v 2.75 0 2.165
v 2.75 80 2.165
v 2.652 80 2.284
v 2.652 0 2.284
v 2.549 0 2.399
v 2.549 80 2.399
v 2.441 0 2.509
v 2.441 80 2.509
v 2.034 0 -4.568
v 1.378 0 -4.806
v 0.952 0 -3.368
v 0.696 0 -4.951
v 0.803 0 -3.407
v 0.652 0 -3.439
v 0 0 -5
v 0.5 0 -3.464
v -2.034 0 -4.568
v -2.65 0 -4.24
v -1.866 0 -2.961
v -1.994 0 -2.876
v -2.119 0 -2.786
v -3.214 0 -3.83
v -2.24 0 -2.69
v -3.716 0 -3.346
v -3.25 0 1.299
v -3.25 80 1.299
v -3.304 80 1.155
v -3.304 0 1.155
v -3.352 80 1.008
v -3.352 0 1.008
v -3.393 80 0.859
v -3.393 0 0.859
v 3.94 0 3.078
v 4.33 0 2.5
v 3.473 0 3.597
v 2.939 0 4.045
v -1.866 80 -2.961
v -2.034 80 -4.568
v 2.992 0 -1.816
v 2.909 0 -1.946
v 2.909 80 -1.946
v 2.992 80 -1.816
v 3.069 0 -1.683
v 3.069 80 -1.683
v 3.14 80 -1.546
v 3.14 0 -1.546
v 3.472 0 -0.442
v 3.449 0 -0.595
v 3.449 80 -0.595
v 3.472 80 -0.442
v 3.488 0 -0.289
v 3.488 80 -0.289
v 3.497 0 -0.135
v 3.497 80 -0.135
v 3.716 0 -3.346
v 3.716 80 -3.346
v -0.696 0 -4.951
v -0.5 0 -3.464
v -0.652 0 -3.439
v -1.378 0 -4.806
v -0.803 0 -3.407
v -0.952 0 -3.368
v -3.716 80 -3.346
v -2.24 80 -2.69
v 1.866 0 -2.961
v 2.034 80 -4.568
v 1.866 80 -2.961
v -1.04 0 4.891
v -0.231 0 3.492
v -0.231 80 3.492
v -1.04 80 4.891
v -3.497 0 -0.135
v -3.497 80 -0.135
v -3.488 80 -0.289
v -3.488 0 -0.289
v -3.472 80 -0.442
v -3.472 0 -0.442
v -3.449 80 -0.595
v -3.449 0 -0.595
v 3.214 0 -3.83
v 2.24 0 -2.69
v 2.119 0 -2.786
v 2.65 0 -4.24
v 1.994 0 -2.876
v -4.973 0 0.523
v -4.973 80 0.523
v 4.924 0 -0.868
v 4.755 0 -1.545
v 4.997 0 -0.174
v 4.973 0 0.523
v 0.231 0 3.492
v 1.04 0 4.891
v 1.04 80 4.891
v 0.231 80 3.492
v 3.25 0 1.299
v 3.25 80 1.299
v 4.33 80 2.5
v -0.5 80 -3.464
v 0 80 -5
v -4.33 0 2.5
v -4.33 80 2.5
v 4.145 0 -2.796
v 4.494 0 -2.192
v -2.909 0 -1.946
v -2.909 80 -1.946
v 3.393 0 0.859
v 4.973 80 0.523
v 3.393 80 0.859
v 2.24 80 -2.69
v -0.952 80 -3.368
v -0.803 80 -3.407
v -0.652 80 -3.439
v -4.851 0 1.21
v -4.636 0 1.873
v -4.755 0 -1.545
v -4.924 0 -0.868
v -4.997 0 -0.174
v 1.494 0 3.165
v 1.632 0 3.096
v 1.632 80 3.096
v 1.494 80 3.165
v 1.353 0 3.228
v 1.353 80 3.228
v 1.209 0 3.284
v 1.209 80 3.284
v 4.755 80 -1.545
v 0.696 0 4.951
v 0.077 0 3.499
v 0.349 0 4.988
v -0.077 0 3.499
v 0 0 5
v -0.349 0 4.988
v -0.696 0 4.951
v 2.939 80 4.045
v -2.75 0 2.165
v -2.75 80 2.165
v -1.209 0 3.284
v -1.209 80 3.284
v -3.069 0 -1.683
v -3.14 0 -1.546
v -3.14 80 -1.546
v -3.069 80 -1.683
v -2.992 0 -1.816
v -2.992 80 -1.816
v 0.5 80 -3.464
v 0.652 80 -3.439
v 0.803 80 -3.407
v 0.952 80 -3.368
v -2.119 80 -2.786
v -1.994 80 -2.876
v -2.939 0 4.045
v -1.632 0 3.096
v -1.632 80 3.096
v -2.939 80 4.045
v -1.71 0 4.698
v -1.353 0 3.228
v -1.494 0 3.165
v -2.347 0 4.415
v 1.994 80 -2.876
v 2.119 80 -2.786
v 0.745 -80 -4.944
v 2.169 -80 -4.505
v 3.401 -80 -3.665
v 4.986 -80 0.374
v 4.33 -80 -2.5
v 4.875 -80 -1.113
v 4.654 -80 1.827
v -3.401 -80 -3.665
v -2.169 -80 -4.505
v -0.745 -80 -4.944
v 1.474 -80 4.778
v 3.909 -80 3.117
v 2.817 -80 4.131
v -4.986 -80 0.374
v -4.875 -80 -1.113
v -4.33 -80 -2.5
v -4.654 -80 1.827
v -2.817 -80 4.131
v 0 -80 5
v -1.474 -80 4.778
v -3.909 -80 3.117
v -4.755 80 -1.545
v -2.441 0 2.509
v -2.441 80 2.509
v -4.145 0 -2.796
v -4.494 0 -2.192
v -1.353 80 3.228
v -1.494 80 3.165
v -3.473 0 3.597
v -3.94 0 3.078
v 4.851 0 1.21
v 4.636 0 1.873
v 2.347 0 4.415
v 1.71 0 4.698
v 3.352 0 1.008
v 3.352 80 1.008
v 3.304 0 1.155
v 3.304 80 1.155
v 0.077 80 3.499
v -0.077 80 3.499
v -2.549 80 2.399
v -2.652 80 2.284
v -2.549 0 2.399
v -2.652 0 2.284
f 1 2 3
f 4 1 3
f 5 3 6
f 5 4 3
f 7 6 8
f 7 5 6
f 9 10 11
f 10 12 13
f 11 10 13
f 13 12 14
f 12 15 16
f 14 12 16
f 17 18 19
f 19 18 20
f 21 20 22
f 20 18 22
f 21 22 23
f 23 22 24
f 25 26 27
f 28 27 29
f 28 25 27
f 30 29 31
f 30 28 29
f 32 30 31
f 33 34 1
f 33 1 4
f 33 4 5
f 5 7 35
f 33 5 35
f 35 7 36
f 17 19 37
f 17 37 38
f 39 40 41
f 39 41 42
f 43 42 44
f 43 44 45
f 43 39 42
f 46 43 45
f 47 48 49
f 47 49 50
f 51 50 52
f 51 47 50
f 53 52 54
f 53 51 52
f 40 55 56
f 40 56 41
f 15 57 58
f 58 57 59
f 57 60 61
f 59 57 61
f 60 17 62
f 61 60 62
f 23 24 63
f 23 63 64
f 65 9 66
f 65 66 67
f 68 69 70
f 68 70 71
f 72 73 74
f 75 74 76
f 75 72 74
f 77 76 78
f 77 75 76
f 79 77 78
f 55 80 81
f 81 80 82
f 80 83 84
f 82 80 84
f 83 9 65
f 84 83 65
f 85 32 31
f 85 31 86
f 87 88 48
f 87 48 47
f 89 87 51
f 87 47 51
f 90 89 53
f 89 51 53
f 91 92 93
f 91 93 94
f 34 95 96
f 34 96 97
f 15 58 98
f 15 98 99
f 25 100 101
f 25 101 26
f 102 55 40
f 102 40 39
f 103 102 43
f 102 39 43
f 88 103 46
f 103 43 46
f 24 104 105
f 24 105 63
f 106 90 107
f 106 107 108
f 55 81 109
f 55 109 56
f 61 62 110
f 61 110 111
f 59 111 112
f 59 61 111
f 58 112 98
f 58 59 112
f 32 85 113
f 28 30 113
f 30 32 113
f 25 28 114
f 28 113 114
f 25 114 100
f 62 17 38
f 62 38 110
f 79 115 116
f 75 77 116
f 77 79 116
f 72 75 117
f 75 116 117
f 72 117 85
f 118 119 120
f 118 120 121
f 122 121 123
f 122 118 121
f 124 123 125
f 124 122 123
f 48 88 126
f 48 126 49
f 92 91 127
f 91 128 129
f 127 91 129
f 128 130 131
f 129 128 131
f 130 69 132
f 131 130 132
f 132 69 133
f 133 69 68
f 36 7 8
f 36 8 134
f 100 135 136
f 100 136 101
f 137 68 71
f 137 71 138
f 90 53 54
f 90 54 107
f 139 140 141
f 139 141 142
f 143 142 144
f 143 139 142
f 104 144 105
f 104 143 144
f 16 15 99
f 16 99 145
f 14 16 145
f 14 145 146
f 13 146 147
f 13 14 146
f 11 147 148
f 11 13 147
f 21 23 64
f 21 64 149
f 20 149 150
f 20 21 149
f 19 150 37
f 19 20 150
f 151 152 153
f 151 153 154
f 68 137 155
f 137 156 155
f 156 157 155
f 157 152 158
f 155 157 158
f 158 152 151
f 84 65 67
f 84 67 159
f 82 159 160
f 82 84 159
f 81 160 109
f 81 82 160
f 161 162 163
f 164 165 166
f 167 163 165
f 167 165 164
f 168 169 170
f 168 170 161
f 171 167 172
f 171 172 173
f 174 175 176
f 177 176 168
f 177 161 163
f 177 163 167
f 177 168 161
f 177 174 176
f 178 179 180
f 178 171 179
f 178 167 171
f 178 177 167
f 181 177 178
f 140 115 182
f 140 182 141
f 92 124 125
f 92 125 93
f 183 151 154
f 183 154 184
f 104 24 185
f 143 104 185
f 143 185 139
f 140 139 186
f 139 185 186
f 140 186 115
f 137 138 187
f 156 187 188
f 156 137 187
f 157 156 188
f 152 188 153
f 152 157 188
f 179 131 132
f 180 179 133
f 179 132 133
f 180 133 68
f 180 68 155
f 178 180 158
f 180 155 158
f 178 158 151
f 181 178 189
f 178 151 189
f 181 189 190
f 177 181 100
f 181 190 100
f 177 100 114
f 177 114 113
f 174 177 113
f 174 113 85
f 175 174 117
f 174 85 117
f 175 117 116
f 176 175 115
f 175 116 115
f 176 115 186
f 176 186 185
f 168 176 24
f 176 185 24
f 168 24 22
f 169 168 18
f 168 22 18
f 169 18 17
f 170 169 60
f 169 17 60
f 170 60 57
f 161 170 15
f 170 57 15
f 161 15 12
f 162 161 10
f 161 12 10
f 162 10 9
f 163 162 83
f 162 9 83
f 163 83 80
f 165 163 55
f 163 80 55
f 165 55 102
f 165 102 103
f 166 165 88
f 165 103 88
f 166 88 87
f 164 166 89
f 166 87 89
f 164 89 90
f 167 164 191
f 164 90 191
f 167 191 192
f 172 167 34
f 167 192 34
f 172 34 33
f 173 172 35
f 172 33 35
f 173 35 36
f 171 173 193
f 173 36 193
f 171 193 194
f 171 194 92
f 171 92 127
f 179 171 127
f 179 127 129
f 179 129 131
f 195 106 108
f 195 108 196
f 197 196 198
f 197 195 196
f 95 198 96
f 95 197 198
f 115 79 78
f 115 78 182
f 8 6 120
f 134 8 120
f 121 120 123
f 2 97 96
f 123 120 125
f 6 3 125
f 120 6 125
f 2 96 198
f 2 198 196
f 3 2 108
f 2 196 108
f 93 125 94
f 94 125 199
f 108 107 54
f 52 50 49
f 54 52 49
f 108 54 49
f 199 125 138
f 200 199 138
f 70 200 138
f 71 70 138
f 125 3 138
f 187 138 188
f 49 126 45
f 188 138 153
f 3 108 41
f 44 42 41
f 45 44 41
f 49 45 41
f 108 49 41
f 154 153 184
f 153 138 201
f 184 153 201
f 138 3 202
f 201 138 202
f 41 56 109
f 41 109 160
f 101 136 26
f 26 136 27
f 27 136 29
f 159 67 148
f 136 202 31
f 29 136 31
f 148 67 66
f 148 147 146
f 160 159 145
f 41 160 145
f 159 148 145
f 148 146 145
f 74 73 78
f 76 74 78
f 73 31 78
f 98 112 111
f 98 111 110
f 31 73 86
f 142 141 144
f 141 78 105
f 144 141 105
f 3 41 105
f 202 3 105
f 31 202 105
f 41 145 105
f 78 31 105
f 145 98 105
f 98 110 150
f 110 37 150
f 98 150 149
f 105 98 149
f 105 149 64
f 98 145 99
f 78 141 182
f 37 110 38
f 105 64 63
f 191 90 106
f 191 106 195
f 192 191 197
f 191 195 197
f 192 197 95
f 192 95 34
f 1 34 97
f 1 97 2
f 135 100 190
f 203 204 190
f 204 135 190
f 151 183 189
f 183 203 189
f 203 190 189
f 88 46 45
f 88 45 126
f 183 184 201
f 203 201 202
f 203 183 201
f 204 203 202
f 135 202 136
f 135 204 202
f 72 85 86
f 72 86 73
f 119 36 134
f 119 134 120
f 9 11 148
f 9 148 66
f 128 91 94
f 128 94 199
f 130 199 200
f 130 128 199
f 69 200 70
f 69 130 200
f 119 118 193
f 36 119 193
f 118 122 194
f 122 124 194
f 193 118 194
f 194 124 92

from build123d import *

# Parameters (mm, degrees)
SKETCH1_W           = 5
SKETCH1_H           = 80
BOSS_EXTRUDE1_DEPTH = 80


with BuildPart() as part:
    # Sketch1 → Revolve1 (revolve)
    with BuildSketch(Plane.XY, mode=Mode.PRIVATE) as revolve1_sk:
        with Locations((-2.5, -40)):
            Rectangle(SKETCH1_W, SKETCH1_H)
    revolve(revolve1_sk.sketch.rotate(Axis((0, 80, 0), (0, -1, 0)), 270), axis=Axis((0, 80, 0), (0, -1, 0)))

    # Sketch2 → Boss-Extrude1 (add)
    with BuildSketch(Plane(origin=(0, 0, 0), x_dir=(1, 0, 0), z_dir=(0, 1, 0))):
        with BuildLine():
            Line((-0.5, 3.464101615), (0, 5))
            Line((0, 5), (0.5, 3.464101615))
            ThreePointArc((0.5, 3.464101615), (0.727690918, 3.423516603), (0.952204333, 3.367982617))
            Line((0.952204333, 3.367982617), (2.033683215, 4.567727288))
            Line((2.033683215, 4.567727288), (1.865749791, 2.961245974))
            ThreePointArc((1.865749791, 2.961245974), (2.057248383, 2.83155948), (2.239763887, 2.689508827))
            Line((2.239763887, 2.689508827), (3.715724127, 3.345653032))
            Line((3.715724127, 3.345653032), (2.908894493, 1.946364001))
            ThreePointArc((2.908894493, 1.946364001), (3.031088913, 1.75), (3.140047917, 1.545994527))
            Line((3.140047917, 1.545994527), (4.755282581, 1.545084972))
            Line((4.755282581, 1.545084972), (3.449064911, 0.594938011))
            ThreePointArc((3.449064911, 0.594938011), (3.480826634, 0.365849621), (3.497389136, 0.135163729))
            Line((3.497389136, 0.135163729), (4.972609477, -0.522642316))
            Line((4.972609477, -0.522642316), (3.392860672, -0.859358166))
            ThreePointArc((3.392860672, -0.859358166), (3.328697807, -1.08155948), (3.25, -1.299038106))
            Line((3.25, -1.299038106), (4.330127019, -2.5))
            Line((4.330127019, -2.5), (2.75, -2.165063509))
            ThreePointArc((2.75, -2.165063509), (2.601006889, -2.341957122), (2.440656339, -2.508624451))
            Line((2.440656339, -2.508624451), (2.938926261, -4.045084972))
            Line((2.938926261, -4.045084972), (1.631639345, -3.096409703))
            ThreePointArc((1.631639345, -3.096409703), (1.423578251, -3.197409102), (1.209301024, -3.284446838))
            Line((1.209301024, -3.284446838), (1.039558454, -4.890738004))
            Line((1.039558454, -4.890738004), (0.231153424, -3.492358529))
            ThreePointArc((0.231153424, -3.492358529), (0, -3.5), (-0.231153424, -3.492358529))
            Line((-0.231153424, -3.492358529), (-1.039558454, -4.890738004))
            Line((-1.039558454, -4.890738004), (-1.209301024, -3.284446838))
            ThreePointArc((-1.209301024, -3.284446838), (-1.423578251, -3.197409102), (-1.631639345, -3.096409703))
            Line((-1.631639345, -3.096409703), (-2.938926261, -4.045084972))
            Line((-2.938926261, -4.045084972), (-2.440656339, -2.508624451))
            ThreePointArc((-2.440656339, -2.508624451), (-2.601006889, -2.341957122), (-2.75, -2.165063509))
            Line((-2.75, -2.165063509), (-4.330127019, -2.5))
            Line((-4.330127019, -2.5), (-3.25, -1.299038106))
            ThreePointArc((-3.25, -1.299038106), (-3.328697807, -1.08155948), (-3.392860672, -0.859358166))
            Line((-3.392860672, -0.859358166), (-4.972609477, -0.522642316))
            Line((-4.972609477, -0.522642316), (-3.497389136, 0.135163729))
            ThreePointArc((-3.497389136, 0.135163729), (-3.480826634, 0.365849621), (-3.449064911, 0.594938011))
            Line((-3.449064911, 0.594938011), (-4.755282581, 1.545084972))
            Line((-4.755282581, 1.545084972), (-3.140047917, 1.545994527))
            ThreePointArc((-3.140047917, 1.545994527), (-3.031088913, 1.75), (-2.908894493, 1.946364001))
            Line((-2.908894493, 1.946364001), (-3.715724127, 3.345653032))
            Line((-3.715724127, 3.345653032), (-2.239763887, 2.689508827))
            ThreePointArc((-2.239763887, 2.689508827), (-2.057248383, 2.83155948), (-1.865749791, 2.961245974))
            Line((-1.865749791, 2.961245974), (-2.033683215, 4.567727288))
            Line((-2.033683215, 4.567727288), (-0.952204333, 3.367982617))
            ThreePointArc((-0.952204333, 3.367982617), (-0.727690918, 3.423516603), (-0.5, 3.464101615))
        make_face()
    extrude(amount=BOSS_EXTRUDE1_DEPTH)


solid = part.part
